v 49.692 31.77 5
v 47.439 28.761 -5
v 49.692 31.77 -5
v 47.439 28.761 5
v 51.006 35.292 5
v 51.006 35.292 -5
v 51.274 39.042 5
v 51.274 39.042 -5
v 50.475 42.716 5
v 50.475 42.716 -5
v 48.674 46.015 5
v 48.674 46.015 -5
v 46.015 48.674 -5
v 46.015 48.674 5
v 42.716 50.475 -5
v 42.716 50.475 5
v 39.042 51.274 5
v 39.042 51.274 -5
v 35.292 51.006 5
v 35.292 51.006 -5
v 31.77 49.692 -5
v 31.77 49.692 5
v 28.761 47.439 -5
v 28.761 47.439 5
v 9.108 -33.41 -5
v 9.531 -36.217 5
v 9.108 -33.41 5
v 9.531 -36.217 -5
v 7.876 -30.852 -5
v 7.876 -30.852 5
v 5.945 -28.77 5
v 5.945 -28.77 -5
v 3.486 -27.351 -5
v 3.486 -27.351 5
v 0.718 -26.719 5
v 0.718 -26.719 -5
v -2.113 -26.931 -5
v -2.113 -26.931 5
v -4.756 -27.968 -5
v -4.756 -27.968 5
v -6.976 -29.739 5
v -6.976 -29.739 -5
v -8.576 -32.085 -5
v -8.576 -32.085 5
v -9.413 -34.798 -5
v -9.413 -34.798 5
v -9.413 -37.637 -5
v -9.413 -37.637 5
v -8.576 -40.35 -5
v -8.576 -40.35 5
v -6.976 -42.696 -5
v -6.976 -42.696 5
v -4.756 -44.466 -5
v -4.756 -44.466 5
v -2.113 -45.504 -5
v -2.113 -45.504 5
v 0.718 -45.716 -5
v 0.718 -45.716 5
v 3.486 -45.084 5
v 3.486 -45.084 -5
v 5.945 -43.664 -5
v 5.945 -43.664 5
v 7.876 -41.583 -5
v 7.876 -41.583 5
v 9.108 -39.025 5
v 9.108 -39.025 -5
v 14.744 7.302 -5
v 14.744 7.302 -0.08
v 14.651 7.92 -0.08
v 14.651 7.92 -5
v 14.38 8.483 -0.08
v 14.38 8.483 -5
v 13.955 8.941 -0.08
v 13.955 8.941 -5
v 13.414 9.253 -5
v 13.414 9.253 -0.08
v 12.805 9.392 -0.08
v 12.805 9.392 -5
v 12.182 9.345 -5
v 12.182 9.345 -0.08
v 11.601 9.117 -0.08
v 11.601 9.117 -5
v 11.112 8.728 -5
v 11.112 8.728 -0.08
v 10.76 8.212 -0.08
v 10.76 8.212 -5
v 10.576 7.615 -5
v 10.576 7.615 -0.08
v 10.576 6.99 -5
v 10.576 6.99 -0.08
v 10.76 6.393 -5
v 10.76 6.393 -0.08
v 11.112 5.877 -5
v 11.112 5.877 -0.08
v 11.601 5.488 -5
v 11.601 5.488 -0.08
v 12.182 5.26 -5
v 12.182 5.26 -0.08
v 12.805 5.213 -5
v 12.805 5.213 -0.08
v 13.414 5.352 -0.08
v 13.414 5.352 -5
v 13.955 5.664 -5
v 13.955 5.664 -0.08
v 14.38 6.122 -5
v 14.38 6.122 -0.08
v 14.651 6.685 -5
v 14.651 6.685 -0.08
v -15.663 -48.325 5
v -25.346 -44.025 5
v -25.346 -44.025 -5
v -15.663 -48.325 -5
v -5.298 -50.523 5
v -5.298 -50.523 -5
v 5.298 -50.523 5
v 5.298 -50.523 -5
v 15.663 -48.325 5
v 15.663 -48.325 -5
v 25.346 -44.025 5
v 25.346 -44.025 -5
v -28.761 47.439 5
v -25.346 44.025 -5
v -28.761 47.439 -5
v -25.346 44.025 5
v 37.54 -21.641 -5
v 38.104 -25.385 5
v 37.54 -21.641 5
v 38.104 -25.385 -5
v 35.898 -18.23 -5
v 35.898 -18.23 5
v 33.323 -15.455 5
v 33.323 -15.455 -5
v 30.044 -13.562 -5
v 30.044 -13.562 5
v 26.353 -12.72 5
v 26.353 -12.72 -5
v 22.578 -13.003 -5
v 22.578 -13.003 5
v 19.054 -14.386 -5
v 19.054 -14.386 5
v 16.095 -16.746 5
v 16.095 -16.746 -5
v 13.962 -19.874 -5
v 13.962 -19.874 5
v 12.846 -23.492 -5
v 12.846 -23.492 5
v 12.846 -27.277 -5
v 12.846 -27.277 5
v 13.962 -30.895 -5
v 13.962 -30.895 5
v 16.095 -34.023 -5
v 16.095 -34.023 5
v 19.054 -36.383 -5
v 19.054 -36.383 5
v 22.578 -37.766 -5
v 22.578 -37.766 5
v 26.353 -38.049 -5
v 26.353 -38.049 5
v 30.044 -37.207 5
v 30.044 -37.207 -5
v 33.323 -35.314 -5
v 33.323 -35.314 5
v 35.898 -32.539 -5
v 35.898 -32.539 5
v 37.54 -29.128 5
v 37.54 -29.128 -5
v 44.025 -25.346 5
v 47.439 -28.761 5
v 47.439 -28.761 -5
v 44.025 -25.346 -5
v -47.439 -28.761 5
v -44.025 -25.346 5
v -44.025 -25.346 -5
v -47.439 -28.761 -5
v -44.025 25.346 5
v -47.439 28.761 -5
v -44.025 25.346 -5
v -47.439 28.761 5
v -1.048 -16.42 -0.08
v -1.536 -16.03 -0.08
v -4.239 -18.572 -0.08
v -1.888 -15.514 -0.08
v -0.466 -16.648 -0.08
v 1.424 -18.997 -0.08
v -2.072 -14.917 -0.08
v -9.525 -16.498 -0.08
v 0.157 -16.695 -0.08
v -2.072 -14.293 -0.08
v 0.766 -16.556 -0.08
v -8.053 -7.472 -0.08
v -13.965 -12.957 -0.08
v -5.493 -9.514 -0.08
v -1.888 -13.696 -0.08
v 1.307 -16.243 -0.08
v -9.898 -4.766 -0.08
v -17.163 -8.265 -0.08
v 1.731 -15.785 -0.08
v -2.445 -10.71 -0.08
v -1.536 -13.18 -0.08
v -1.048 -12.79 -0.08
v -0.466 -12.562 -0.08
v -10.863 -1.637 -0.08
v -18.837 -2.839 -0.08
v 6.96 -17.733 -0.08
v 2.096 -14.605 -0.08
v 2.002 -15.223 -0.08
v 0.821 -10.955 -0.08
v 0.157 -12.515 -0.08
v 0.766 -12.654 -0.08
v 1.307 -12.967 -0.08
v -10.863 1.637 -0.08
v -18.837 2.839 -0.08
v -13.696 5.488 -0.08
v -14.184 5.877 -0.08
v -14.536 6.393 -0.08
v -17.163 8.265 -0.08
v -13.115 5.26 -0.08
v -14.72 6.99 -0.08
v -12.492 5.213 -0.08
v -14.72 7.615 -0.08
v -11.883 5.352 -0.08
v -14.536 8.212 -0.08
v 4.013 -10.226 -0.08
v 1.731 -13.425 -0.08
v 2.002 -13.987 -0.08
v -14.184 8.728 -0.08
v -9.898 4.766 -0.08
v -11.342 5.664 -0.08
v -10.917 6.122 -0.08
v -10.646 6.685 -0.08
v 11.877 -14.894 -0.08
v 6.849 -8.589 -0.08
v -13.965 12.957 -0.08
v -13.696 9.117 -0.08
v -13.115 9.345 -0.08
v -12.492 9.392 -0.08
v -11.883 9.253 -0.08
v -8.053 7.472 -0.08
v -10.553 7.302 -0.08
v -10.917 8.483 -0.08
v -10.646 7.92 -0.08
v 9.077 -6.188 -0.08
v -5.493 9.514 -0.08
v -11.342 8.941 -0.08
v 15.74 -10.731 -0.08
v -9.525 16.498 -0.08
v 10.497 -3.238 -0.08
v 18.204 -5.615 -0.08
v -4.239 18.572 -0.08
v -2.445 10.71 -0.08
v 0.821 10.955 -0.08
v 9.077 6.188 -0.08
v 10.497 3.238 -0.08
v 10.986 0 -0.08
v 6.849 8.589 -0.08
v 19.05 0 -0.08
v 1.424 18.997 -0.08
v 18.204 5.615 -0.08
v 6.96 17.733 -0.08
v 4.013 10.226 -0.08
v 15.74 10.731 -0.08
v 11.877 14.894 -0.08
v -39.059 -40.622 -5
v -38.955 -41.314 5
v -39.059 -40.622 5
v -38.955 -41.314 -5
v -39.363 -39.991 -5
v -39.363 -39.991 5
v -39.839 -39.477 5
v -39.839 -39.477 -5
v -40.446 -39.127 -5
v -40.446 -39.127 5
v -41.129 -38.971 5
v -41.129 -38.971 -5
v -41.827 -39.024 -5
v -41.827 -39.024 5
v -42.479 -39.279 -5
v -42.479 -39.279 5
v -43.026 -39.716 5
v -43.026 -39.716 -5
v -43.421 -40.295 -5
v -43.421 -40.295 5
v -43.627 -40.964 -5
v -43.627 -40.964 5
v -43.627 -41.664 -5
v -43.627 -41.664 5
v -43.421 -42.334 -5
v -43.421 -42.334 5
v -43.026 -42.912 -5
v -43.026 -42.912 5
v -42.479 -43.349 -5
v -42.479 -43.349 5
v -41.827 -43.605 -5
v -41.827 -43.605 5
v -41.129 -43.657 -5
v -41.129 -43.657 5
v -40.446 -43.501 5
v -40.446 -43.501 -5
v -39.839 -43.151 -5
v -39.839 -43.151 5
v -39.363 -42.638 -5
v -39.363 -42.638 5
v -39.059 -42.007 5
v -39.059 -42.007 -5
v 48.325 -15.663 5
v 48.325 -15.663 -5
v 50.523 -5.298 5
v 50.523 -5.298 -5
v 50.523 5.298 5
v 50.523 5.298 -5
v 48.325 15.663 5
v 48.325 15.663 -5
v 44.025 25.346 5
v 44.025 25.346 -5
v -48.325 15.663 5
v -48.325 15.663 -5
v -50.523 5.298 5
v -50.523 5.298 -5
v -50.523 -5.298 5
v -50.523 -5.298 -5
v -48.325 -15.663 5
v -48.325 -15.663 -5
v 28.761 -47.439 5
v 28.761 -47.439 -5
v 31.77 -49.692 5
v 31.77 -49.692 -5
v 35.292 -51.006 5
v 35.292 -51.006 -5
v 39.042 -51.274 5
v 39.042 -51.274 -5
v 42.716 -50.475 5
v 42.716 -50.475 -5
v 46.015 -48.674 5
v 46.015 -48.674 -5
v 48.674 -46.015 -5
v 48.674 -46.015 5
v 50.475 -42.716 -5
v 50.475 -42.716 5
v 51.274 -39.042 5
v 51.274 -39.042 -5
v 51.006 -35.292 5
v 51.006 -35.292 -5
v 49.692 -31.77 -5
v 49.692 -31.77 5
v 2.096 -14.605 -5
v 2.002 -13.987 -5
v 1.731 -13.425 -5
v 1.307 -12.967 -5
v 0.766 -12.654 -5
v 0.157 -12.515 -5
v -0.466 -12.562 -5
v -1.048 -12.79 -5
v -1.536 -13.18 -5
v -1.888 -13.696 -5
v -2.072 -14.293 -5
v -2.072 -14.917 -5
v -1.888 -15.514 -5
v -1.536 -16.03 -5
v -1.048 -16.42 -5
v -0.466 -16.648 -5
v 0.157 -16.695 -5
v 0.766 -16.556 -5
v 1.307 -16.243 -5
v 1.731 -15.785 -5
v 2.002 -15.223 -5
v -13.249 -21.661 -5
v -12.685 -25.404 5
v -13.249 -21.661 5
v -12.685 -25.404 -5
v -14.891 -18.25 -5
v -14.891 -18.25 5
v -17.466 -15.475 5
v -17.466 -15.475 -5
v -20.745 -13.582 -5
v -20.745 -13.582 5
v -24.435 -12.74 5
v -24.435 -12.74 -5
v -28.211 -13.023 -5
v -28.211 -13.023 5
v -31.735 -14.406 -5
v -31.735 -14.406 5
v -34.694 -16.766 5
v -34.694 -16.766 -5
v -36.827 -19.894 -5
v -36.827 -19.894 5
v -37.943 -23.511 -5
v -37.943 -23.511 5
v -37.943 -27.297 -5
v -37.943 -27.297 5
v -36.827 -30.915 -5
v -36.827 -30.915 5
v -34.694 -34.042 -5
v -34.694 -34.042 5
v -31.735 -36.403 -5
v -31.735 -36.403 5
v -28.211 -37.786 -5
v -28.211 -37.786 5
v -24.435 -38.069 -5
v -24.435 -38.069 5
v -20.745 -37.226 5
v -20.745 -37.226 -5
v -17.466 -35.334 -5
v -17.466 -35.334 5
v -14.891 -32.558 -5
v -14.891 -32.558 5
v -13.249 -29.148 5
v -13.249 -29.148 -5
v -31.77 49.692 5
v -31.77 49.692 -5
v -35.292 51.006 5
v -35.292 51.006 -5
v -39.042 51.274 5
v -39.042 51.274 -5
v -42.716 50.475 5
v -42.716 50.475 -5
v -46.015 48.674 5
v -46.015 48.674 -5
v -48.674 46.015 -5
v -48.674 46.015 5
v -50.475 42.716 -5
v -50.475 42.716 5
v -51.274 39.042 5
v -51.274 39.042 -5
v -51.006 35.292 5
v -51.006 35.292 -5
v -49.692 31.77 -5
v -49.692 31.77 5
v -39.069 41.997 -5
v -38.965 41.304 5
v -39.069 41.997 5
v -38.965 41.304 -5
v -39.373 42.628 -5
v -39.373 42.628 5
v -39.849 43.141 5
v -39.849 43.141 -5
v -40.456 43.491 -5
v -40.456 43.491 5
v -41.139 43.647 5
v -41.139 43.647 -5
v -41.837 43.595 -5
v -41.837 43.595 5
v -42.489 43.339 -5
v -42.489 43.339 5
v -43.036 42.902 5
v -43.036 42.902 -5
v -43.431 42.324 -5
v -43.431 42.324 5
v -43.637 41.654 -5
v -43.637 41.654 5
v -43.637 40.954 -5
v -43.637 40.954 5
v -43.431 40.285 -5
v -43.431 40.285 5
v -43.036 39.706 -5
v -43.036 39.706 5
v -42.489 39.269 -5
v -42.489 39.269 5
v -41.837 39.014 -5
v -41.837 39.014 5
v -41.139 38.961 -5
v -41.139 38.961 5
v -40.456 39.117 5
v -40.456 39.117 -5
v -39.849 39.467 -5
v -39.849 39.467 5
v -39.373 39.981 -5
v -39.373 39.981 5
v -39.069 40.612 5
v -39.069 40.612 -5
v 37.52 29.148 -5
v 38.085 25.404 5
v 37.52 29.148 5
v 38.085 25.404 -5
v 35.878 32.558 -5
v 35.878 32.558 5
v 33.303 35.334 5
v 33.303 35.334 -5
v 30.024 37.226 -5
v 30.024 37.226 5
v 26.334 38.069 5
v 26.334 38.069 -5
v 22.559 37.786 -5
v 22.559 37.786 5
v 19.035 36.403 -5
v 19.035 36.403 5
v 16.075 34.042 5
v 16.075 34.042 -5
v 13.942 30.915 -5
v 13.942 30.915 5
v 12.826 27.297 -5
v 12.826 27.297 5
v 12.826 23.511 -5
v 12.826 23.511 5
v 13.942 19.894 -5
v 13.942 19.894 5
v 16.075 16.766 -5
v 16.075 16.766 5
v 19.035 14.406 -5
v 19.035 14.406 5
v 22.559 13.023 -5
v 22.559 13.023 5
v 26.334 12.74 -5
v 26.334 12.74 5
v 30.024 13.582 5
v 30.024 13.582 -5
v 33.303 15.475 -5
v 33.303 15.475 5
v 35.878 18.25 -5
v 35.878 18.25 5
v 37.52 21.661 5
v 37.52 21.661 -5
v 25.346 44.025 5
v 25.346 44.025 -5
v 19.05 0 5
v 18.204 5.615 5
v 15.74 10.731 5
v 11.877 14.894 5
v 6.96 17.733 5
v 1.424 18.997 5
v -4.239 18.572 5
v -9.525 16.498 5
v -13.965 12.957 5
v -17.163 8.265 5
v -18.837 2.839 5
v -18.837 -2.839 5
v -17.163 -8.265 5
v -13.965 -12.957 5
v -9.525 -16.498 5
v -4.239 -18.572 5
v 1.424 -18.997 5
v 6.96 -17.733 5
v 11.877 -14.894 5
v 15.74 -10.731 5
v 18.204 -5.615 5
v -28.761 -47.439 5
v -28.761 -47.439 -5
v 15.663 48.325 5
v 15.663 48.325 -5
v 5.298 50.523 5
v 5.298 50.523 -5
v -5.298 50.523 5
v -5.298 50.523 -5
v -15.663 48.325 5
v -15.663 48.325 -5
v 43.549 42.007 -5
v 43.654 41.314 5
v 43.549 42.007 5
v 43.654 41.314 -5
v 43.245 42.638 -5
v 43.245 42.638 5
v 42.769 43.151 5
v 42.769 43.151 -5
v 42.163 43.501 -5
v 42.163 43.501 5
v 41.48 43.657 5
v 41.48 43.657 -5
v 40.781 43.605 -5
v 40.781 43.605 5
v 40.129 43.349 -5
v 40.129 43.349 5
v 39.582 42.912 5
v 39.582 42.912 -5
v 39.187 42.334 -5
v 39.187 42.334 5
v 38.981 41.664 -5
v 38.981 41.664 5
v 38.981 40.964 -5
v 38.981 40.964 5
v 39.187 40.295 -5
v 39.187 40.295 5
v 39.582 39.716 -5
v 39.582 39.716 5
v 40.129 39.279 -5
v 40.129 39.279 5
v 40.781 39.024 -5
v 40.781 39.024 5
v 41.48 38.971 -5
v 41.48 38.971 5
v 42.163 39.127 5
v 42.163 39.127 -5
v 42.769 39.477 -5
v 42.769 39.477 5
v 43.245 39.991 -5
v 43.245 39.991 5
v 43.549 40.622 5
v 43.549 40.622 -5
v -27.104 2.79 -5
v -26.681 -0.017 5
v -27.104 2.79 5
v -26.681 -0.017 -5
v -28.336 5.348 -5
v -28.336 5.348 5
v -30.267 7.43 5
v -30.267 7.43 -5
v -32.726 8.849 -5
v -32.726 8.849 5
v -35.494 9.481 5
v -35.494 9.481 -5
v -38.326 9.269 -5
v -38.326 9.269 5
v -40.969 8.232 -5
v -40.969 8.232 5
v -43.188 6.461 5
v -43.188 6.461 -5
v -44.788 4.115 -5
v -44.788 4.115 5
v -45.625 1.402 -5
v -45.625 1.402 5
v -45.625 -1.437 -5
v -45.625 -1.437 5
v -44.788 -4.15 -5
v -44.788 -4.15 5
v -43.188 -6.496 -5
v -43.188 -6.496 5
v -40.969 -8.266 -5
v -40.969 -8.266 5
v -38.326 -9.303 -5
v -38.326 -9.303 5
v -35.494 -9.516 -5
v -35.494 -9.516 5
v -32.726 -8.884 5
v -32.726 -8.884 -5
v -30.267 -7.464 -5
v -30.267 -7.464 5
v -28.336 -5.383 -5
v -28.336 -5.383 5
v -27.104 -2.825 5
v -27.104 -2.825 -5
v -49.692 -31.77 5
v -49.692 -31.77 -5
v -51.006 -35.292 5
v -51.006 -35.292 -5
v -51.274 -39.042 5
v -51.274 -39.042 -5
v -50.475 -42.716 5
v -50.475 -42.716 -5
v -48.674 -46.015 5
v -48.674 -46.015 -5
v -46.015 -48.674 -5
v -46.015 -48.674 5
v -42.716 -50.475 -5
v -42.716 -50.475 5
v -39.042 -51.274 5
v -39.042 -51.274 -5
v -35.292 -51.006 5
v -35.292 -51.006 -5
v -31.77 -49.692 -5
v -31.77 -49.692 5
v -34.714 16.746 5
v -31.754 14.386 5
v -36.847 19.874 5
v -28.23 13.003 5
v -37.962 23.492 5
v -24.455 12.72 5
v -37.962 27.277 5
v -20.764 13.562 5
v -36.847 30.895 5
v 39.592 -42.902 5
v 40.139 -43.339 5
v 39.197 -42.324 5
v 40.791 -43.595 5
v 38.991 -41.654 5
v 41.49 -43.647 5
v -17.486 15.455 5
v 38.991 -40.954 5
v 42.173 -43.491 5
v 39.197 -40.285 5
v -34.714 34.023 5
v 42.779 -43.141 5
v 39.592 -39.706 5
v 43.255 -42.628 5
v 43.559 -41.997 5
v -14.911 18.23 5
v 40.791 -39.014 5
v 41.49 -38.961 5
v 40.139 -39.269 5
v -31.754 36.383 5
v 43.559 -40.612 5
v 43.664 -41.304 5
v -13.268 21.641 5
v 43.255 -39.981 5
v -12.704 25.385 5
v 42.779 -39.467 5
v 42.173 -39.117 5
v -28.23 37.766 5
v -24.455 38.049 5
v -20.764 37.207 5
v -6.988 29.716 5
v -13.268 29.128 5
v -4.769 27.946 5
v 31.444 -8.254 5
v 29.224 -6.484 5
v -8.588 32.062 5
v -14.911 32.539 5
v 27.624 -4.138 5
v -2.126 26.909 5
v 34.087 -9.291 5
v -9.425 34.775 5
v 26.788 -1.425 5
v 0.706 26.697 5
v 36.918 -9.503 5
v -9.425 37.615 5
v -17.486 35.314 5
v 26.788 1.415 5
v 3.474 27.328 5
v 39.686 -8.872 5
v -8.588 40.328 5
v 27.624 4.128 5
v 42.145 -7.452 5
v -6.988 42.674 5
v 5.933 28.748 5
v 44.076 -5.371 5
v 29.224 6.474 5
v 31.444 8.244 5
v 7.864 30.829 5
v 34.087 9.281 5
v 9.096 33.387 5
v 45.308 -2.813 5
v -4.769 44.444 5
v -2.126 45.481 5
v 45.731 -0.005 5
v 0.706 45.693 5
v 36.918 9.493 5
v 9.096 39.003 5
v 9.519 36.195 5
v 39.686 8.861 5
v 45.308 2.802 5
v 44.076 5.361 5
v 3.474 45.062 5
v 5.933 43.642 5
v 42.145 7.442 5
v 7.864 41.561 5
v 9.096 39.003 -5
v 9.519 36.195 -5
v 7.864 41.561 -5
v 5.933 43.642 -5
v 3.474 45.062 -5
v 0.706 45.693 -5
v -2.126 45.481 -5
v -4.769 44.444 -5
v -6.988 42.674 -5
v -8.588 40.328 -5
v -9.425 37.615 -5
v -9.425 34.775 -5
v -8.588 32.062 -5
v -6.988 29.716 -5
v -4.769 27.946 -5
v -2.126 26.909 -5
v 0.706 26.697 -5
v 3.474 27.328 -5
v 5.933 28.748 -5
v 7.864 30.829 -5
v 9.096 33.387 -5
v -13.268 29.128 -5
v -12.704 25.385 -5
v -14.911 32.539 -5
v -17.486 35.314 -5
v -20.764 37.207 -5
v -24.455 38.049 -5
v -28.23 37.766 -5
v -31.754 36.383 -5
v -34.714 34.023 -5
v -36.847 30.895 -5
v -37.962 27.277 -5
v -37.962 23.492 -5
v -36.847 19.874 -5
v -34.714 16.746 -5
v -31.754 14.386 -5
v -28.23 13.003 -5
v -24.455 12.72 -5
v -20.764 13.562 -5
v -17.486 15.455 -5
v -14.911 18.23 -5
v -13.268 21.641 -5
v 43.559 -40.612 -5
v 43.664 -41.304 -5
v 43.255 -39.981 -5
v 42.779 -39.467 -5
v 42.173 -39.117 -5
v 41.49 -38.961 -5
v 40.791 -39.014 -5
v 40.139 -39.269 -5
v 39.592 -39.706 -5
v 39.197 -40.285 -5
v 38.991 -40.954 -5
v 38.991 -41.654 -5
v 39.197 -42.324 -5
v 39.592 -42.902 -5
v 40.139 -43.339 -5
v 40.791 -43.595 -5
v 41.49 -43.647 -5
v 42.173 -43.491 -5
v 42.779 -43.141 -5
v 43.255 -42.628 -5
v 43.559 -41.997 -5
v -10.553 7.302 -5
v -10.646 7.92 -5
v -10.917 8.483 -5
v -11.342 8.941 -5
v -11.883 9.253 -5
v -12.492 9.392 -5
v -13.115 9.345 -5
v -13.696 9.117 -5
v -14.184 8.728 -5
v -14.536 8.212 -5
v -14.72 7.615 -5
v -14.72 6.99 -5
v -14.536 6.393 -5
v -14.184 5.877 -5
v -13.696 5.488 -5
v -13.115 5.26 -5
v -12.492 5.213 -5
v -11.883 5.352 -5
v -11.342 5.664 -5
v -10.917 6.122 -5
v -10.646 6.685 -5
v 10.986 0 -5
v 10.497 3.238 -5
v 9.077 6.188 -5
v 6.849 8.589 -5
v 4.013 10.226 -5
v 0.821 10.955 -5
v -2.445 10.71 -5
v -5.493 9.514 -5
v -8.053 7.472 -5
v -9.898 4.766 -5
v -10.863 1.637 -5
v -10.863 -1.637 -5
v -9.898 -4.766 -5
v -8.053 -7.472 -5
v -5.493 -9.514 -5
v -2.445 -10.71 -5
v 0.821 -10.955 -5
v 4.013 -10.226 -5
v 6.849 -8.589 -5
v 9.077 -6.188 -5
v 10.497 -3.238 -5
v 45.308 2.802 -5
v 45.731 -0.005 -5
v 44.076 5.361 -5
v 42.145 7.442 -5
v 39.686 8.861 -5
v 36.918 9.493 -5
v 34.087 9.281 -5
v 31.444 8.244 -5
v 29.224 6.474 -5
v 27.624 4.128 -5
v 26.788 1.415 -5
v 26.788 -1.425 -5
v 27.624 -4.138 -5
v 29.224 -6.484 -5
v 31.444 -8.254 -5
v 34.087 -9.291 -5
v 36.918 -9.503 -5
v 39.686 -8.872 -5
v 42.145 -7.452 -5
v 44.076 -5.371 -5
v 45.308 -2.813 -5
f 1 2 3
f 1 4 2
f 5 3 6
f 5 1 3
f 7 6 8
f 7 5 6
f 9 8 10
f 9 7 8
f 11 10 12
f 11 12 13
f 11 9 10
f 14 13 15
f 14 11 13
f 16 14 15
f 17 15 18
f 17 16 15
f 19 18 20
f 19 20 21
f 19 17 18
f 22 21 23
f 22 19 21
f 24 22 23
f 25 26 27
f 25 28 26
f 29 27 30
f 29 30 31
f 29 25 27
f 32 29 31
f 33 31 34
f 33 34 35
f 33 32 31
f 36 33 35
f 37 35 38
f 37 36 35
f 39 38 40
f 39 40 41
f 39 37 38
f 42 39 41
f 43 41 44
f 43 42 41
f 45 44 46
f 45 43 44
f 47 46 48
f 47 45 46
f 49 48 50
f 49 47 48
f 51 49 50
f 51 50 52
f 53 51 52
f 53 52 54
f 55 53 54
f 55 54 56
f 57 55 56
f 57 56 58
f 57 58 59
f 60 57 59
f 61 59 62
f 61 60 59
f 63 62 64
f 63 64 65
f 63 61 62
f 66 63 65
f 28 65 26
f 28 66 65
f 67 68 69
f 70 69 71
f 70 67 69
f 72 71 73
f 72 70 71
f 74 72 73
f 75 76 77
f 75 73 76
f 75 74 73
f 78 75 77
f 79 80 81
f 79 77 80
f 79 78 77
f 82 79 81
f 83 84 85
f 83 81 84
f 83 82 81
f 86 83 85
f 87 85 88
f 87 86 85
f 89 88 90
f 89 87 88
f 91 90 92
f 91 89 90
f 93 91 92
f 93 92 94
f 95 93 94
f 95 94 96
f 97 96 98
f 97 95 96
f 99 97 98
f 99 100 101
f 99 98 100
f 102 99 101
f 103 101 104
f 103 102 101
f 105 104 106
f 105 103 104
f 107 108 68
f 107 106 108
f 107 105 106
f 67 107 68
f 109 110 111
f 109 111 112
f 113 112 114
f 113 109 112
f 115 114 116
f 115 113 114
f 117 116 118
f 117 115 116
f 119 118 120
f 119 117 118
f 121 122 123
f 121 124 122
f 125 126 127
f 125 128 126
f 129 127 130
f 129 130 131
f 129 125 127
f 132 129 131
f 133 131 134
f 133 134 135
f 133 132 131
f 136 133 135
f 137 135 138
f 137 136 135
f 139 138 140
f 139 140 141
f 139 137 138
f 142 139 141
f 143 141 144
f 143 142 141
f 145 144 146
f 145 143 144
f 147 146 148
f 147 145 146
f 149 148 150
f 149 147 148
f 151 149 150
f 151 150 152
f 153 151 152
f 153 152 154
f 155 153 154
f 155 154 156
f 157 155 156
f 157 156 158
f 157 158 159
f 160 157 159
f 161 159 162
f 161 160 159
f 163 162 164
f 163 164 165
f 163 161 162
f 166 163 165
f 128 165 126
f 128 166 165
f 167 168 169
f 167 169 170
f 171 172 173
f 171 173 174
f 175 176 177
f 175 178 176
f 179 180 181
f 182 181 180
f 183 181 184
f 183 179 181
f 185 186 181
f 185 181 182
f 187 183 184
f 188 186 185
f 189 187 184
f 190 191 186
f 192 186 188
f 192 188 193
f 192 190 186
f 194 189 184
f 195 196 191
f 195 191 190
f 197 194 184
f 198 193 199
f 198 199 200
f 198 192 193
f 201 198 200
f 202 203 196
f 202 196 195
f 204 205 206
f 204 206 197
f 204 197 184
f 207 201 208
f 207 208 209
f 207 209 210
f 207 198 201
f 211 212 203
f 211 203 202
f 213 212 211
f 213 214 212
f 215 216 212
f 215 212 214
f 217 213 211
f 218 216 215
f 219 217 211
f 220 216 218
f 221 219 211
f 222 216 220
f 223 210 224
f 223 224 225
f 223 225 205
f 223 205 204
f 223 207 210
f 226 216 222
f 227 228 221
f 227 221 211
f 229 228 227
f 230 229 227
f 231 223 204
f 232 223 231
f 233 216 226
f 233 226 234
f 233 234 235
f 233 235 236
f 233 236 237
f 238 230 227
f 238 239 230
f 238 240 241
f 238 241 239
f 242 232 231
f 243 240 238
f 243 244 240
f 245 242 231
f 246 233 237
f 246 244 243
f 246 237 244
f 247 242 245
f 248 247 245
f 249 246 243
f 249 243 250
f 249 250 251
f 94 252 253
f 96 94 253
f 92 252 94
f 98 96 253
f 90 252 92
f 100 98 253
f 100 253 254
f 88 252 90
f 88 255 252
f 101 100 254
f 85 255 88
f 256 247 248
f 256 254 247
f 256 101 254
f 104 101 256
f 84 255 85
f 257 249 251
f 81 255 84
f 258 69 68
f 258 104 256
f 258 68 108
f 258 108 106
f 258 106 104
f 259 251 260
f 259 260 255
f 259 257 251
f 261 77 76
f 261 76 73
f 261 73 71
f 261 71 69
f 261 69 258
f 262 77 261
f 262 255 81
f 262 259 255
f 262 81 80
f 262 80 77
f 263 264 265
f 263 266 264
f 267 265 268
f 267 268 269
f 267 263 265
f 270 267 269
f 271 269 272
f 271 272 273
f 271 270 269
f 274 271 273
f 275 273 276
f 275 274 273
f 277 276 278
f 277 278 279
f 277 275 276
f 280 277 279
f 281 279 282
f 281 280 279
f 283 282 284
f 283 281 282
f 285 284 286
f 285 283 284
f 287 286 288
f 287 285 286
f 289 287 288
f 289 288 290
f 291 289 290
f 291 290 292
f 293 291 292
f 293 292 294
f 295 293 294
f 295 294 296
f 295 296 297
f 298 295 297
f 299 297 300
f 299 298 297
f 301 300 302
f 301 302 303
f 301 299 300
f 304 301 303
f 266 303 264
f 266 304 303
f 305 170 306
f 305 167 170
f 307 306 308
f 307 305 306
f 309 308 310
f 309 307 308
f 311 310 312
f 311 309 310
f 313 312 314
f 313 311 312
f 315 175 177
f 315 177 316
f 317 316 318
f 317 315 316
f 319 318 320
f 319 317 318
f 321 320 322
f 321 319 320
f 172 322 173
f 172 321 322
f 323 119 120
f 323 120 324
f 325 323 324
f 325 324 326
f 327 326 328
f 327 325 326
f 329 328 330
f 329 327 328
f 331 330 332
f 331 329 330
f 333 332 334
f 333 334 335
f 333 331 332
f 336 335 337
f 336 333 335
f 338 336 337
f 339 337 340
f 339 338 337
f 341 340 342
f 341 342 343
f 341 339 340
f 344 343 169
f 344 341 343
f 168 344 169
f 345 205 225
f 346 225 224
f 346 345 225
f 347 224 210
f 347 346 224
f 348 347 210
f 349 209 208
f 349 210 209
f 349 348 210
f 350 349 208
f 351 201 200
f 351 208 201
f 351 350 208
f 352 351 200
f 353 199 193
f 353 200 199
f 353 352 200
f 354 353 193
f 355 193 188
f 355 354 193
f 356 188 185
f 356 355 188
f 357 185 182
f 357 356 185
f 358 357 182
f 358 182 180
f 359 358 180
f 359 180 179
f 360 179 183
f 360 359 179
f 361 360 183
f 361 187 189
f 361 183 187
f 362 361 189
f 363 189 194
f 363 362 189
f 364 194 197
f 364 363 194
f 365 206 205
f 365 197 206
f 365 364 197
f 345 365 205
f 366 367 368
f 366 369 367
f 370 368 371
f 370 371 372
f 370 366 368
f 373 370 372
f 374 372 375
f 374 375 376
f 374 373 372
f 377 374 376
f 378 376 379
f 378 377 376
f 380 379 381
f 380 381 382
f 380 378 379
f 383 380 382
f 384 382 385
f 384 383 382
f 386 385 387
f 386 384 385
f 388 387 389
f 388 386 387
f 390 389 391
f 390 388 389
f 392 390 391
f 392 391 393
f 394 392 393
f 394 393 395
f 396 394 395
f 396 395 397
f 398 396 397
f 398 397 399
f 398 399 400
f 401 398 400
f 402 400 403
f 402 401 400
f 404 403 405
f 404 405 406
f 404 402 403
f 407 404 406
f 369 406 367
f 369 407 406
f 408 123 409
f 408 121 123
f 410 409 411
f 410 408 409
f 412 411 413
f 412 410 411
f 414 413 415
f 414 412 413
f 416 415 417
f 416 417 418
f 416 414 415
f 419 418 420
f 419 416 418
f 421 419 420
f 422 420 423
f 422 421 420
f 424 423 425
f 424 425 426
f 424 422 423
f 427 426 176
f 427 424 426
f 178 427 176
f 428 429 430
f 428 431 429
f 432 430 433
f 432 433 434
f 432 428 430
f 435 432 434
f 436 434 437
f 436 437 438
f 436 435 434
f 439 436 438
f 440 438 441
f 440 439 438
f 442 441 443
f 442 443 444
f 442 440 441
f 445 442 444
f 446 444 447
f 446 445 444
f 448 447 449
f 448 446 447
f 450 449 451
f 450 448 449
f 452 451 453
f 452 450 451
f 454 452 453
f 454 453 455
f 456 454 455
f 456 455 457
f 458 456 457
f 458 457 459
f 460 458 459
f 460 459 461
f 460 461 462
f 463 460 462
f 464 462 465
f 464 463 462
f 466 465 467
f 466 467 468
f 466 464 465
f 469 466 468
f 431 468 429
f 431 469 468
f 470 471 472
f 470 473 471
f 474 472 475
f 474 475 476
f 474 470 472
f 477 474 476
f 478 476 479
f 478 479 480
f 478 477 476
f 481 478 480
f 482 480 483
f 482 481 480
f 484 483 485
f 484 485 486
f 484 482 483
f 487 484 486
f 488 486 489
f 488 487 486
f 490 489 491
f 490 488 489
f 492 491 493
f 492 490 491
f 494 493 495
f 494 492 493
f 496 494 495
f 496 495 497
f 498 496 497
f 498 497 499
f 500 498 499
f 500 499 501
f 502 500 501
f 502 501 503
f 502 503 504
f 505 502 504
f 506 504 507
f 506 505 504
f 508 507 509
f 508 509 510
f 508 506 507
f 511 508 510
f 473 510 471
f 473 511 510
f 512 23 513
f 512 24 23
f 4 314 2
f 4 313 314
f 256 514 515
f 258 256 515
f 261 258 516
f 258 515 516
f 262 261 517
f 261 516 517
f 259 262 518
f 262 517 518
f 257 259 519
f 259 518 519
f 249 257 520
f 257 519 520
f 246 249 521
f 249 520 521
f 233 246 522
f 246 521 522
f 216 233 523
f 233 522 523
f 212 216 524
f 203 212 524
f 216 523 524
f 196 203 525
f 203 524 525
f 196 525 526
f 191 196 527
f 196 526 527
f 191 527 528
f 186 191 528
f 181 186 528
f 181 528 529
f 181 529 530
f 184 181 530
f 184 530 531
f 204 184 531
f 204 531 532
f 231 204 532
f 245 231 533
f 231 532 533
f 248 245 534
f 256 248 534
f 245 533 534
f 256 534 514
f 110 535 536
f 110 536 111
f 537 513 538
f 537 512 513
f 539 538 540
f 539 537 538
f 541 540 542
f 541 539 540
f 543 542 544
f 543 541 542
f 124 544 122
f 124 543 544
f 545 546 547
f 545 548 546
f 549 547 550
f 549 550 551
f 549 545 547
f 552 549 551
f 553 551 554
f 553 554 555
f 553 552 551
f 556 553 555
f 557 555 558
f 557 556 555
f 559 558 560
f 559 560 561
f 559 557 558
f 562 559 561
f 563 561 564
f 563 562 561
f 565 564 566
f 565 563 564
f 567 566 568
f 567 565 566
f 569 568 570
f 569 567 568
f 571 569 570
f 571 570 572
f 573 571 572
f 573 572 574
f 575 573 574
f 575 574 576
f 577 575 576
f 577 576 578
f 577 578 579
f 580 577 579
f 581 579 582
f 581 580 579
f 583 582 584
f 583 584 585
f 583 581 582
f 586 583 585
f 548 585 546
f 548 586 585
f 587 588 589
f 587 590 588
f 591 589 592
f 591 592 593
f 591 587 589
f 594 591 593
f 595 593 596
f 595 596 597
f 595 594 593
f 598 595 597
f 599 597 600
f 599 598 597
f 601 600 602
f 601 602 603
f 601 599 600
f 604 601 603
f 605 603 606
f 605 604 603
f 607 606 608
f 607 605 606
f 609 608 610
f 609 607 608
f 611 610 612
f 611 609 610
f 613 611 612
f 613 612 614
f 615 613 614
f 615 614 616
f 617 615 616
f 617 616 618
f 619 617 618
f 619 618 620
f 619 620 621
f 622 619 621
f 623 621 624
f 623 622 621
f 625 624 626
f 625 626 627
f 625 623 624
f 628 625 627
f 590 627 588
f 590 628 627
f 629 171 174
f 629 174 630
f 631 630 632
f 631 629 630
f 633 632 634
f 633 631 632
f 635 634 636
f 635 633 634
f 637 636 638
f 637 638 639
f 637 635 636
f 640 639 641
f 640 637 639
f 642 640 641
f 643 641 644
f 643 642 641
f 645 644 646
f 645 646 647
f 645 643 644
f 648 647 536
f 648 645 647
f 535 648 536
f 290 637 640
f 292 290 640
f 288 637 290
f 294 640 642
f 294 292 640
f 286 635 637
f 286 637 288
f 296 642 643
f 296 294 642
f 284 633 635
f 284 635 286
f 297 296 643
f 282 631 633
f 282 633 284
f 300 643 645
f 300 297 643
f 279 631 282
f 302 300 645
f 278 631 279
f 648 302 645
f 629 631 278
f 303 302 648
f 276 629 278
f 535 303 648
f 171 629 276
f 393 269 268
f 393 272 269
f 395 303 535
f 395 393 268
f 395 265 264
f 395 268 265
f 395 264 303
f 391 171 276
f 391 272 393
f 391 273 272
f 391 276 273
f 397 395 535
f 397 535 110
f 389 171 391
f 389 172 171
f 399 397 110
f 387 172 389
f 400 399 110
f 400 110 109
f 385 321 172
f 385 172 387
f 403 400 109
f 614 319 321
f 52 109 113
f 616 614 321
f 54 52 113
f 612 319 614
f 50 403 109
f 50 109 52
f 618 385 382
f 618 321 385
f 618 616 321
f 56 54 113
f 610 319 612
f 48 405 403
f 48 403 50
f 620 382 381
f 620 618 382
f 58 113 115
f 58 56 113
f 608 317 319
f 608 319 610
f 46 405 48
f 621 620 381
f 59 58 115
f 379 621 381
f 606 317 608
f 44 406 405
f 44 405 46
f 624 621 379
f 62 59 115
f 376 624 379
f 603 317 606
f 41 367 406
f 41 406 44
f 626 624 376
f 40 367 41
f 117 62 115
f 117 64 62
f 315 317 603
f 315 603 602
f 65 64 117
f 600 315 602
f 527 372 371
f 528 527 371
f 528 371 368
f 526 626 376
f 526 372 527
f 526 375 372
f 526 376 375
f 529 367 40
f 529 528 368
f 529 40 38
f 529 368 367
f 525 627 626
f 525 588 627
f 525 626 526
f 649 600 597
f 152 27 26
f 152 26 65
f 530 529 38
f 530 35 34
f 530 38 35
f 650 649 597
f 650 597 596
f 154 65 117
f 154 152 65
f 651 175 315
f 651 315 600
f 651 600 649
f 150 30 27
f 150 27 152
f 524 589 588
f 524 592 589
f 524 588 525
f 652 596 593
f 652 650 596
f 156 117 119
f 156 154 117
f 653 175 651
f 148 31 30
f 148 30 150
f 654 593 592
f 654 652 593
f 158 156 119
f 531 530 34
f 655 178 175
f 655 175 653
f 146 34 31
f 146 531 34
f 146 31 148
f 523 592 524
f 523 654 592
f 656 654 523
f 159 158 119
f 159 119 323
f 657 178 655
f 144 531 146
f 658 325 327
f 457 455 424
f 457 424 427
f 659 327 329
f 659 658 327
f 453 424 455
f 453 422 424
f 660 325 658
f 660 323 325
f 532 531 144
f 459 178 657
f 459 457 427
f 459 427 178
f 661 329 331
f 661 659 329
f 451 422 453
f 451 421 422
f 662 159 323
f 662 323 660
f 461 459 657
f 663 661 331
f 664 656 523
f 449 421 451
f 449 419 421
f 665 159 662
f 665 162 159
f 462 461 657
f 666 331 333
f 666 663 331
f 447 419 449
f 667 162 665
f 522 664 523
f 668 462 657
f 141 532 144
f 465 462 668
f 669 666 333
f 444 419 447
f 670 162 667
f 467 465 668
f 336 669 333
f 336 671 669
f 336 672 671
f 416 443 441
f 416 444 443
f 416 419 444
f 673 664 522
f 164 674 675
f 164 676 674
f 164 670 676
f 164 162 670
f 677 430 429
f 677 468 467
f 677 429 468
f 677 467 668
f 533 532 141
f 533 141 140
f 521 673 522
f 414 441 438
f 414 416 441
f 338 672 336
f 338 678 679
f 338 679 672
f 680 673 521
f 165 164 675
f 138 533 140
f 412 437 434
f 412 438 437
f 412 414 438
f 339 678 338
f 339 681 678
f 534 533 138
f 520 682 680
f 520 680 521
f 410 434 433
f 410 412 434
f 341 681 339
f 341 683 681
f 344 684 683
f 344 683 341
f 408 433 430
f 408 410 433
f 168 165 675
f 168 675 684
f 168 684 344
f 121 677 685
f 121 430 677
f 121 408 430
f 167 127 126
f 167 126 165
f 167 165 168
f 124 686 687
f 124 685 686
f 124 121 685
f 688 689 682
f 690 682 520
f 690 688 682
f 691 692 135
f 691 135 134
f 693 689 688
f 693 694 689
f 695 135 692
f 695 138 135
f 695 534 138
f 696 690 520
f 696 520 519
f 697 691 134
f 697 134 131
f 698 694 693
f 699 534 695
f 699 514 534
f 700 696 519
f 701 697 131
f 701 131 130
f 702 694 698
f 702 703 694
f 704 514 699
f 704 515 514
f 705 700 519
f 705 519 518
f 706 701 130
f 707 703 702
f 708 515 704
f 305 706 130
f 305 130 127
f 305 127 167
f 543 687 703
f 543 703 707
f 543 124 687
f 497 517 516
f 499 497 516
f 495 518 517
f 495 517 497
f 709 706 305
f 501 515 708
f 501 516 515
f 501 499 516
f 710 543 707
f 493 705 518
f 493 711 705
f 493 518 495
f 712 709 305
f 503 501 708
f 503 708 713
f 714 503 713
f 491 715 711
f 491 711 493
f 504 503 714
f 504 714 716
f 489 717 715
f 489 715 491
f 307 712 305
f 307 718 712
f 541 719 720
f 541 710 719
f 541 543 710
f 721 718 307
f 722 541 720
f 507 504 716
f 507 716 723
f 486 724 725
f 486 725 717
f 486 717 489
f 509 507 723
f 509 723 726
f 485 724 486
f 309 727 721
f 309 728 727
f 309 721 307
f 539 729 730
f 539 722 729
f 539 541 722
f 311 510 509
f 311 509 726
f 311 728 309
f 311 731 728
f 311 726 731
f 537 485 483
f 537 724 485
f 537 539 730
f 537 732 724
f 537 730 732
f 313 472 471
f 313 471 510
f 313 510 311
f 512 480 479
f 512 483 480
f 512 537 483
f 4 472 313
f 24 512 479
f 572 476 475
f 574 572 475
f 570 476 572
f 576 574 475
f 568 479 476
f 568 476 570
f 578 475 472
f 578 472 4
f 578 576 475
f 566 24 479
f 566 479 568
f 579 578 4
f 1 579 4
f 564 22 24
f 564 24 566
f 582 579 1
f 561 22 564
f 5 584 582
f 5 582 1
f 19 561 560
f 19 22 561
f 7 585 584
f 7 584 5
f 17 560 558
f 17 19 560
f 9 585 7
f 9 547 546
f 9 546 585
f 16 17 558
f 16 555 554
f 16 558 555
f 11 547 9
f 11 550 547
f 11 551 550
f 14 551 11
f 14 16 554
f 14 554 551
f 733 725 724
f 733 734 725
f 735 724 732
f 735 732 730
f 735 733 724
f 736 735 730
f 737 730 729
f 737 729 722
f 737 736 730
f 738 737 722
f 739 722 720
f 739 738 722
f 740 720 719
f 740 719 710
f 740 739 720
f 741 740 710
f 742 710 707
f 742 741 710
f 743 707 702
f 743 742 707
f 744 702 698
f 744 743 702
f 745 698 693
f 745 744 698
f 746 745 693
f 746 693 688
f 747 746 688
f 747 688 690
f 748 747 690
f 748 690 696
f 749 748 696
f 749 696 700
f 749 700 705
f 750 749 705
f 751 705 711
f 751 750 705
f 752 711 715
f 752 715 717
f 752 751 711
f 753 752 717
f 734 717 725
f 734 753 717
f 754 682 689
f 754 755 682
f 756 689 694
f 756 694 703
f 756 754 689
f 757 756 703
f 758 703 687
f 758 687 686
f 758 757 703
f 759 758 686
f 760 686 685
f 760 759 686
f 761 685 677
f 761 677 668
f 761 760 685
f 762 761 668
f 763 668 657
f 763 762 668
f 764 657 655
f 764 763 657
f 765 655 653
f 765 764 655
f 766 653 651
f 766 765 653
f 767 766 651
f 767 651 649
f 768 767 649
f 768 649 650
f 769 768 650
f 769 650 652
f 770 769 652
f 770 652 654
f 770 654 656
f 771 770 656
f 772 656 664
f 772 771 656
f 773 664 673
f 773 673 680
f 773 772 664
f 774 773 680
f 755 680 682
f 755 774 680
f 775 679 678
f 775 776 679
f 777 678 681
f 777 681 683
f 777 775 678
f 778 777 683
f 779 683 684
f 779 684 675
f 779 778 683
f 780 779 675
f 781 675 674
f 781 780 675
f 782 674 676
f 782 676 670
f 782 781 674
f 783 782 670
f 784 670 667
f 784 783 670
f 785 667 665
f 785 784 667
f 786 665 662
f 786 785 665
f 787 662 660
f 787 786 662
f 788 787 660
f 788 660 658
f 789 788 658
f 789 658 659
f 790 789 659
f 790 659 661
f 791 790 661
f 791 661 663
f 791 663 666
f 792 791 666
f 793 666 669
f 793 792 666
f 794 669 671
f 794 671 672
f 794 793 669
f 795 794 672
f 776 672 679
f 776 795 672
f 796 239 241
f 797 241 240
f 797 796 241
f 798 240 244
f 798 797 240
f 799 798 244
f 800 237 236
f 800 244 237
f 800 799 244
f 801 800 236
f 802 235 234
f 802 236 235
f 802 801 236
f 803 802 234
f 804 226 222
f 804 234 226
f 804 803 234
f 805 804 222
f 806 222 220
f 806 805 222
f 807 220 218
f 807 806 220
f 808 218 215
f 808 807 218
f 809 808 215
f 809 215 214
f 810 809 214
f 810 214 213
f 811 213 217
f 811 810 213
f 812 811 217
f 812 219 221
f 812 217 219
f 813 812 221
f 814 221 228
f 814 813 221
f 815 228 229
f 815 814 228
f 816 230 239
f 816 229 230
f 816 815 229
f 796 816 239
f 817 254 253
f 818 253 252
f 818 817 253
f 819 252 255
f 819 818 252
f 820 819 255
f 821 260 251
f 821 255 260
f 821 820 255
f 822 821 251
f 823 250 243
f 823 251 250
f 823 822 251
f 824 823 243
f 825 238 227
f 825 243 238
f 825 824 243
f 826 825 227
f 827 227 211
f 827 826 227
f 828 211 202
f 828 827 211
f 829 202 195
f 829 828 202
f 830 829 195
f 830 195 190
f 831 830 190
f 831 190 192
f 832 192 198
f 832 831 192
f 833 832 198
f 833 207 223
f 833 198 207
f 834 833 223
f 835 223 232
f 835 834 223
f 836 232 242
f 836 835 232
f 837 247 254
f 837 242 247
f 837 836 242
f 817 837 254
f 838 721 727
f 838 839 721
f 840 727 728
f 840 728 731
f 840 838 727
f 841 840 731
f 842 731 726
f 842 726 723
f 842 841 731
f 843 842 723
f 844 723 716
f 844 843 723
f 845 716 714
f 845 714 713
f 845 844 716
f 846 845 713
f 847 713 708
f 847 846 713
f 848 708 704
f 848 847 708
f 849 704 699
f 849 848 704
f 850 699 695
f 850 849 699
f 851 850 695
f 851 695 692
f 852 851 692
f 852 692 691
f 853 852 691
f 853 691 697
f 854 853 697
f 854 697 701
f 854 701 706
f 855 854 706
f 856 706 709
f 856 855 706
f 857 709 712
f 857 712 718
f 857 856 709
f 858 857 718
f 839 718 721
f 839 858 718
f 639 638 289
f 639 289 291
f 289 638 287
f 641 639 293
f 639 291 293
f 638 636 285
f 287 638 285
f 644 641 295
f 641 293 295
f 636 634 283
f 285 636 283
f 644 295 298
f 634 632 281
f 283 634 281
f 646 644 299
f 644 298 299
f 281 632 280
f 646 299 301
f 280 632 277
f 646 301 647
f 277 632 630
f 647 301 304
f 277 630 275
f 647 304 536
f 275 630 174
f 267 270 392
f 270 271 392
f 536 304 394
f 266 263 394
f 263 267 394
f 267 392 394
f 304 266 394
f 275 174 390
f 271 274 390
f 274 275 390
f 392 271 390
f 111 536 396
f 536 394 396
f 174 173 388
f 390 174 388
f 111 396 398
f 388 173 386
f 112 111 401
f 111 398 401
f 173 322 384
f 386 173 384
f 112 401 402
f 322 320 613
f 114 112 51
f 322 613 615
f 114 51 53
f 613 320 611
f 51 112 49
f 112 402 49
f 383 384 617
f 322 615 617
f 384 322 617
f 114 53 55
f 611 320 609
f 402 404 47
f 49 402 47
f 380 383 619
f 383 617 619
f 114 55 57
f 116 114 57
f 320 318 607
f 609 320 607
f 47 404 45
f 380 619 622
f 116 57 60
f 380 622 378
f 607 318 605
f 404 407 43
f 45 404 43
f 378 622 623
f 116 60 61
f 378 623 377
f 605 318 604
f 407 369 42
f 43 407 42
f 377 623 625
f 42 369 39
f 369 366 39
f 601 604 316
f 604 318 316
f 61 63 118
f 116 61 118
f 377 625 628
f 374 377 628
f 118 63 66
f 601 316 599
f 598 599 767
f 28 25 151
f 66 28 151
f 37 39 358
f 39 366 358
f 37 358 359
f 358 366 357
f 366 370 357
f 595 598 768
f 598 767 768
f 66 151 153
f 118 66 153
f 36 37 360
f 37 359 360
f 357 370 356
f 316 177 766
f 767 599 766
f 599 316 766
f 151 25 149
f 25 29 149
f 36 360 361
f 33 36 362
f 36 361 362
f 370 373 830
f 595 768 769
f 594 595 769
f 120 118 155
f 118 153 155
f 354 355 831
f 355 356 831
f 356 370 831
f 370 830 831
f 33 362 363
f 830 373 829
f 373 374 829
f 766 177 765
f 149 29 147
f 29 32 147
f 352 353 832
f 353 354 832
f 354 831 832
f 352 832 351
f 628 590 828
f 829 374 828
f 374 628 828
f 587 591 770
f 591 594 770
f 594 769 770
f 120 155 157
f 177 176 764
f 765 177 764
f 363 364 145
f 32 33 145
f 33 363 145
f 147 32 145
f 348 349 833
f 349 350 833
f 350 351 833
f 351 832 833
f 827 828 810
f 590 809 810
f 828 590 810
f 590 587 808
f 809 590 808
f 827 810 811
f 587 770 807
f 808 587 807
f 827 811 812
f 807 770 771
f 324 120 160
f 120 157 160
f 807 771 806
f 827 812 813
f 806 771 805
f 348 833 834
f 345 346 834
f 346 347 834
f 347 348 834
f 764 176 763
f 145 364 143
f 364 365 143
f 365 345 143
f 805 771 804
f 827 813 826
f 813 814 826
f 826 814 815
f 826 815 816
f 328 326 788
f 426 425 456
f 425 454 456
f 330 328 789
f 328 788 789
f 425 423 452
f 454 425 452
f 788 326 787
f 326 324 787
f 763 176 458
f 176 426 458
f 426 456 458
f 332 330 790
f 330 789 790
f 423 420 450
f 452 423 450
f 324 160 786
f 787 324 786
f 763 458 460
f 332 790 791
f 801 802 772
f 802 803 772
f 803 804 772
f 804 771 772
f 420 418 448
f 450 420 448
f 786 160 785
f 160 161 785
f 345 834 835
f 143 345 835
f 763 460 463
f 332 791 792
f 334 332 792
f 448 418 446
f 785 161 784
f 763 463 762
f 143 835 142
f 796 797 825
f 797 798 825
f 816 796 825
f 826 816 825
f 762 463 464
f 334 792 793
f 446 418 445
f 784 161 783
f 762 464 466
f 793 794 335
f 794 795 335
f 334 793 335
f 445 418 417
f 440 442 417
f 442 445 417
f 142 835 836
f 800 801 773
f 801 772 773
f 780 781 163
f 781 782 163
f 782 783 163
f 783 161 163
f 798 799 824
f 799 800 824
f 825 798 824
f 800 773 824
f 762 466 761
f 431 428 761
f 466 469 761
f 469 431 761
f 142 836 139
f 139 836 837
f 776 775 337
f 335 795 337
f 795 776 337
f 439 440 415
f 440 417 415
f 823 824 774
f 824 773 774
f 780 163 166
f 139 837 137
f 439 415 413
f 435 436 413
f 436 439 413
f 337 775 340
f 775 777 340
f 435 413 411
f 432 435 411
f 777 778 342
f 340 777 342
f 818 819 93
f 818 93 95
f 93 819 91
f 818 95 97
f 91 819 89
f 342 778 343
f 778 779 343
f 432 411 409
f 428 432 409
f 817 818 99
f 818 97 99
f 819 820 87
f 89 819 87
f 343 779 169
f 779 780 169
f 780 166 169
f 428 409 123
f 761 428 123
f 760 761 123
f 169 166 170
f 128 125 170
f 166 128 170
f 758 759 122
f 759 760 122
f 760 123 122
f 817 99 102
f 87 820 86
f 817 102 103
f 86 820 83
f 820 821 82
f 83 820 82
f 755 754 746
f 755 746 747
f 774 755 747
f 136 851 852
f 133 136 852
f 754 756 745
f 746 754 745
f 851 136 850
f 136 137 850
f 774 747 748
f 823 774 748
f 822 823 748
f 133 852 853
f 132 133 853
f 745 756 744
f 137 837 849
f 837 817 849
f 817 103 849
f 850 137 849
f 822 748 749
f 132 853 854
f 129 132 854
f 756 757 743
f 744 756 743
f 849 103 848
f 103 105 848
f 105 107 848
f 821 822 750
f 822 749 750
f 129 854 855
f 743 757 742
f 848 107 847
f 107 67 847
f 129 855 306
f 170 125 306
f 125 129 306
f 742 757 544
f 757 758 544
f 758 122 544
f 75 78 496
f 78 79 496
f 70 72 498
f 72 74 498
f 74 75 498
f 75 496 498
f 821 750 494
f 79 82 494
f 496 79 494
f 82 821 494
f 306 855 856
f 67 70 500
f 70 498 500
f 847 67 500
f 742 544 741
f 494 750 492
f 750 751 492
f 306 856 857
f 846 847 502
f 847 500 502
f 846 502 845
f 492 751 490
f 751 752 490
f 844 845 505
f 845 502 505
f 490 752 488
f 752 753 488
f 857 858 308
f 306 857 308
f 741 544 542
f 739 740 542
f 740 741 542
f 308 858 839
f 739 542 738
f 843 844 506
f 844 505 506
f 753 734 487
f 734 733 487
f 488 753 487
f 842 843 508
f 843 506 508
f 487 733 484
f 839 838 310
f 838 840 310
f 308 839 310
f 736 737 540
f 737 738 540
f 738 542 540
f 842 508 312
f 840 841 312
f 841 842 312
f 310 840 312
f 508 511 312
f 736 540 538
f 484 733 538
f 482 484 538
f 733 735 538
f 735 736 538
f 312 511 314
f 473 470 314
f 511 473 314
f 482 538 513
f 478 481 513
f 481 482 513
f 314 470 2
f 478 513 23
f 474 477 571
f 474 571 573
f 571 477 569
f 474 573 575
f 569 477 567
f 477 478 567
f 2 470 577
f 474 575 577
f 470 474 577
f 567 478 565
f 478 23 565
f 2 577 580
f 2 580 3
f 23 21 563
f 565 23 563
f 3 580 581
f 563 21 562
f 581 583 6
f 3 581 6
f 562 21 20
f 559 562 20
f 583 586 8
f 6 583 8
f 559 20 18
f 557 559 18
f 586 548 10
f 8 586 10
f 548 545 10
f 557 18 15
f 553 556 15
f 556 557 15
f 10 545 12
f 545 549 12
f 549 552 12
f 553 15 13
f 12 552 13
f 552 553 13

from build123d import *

# Parameters (mm, degrees)
F0_R     = 2.3495
F0_R_2   = 9.525
F0_R_3   = 12.7
F0_R_4   = 2.0955
F0_R_5   = 10.9855
F1_DEPTH = 5
F2_R     = 19.05
F3_DEPTH = 5.08


with BuildPart() as f1:
    # F0 (on Top) → F1 (new body, symmetric)
    with BuildSketch(Plane.XY):
        with BuildLine():
            Line((-47.439466, 28.760534), (-44.025117, 25.346184))
            ThreePointArc((-44.025117, 25.346184), (-50.8, 0), (-44.025117, -25.346184))
            Line((-44.025117, -25.346184), (-47.439466, -28.760534))
            ThreePointArc((-47.439466, -28.760534), (-47.439466, -47.439466), (-28.760534, -47.439466))
            Line((-28.760534, -47.439466), (-25.346184, -44.025117))
            ThreePointArc((-25.346184, -44.025117), (0, -50.8), (25.346184, -44.025117))
            Line((25.346184, -44.025117), (28.760534, -47.439466))
            ThreePointArc((28.760534, -47.439466), (47.439466, -47.439466), (47.439466, -28.760534))
            Line((47.439466, -28.760534), (44.025117, -25.346184))
            ThreePointArc((44.025117, -25.346184), (50.8, 0), (44.025117, 25.346184))
            Line((44.025117, 25.346184), (47.439466, 28.760534))
            ThreePointArc((47.439466, 28.760534), (47.439466, 47.439466), (28.760534, 47.439466))
            Line((28.760534, 47.439466), (25.346184, 44.025117))
            ThreePointArc((25.346184, 44.025117), (0, 50.8), (-25.346184, 44.025117))
            Line((-25.346184, 44.025117), (-28.760534, 47.439466))
            ThreePointArc((-28.760534, 47.439466), (-47.439466, 47.439466), (-47.439466, 28.760534))
        make_face()
        with Locations((-41.304177, -41.314179)):
            Circle(F0_R, mode=Mode.SUBTRACT)
        with Locations((-36.206166, -0.017254)):
            Circle(F0_R_2, mode=Mode.SUBTRACT)
        with Locations((-25.384562, -25.40427)):
            Circle(F0_R_3, mode=Mode.SUBTRACT)
        with Locations((0.006088, -36.217333)):
            Circle(F0_R_2, mode=Mode.SUBTRACT)
        with Locations((41.314179, -41.304177)):
            Circle(F0_R, mode=Mode.SUBTRACT)
        with Locations((0, -14.605)):
            Circle(F0_R_4, mode=Mode.SUBTRACT)
        with Locations((25.40427, -25.384562)):
            Circle(F0_R_3, mode=Mode.SUBTRACT)
        with Locations((36.206166, -0.005079)):
            Circle(F0_R_2, mode=Mode.SUBTRACT)
        with Locations((-12.648301, 7.3025)):
            Circle(F0_R_4, mode=Mode.SUBTRACT)
        with Locations((-25.40427, 25.384562)):
            Circle(F0_R_3, mode=Mode.SUBTRACT)
        with Locations((-41.314179, 41.304177)):
            Circle(F0_R, mode=Mode.SUBTRACT)
        with Locations((-0.006088, 36.195)):
            Circle(F0_R_2, mode=Mode.SUBTRACT)
        Circle(F0_R_5, mode=Mode.SUBTRACT)
        with Locations((12.648301, 7.3025)):
            Circle(F0_R_4, mode=Mode.SUBTRACT)
        with Locations((25.384562, 25.40427)):
            Circle(F0_R_3, mode=Mode.SUBTRACT)
        with Locations((41.304177, 41.314179)):
            Circle(F0_R, mode=Mode.SUBTRACT)
    extrude(amount=F1_DEPTH, both=True)

    # F2 (on face) → F3 (cut)
    with BuildSketch(Plane.XY.offset(5)):
        Circle(F2_R)
    extrude(amount=-F3_DEPTH, mode=Mode.SUBTRACT)


solid = f1.part
